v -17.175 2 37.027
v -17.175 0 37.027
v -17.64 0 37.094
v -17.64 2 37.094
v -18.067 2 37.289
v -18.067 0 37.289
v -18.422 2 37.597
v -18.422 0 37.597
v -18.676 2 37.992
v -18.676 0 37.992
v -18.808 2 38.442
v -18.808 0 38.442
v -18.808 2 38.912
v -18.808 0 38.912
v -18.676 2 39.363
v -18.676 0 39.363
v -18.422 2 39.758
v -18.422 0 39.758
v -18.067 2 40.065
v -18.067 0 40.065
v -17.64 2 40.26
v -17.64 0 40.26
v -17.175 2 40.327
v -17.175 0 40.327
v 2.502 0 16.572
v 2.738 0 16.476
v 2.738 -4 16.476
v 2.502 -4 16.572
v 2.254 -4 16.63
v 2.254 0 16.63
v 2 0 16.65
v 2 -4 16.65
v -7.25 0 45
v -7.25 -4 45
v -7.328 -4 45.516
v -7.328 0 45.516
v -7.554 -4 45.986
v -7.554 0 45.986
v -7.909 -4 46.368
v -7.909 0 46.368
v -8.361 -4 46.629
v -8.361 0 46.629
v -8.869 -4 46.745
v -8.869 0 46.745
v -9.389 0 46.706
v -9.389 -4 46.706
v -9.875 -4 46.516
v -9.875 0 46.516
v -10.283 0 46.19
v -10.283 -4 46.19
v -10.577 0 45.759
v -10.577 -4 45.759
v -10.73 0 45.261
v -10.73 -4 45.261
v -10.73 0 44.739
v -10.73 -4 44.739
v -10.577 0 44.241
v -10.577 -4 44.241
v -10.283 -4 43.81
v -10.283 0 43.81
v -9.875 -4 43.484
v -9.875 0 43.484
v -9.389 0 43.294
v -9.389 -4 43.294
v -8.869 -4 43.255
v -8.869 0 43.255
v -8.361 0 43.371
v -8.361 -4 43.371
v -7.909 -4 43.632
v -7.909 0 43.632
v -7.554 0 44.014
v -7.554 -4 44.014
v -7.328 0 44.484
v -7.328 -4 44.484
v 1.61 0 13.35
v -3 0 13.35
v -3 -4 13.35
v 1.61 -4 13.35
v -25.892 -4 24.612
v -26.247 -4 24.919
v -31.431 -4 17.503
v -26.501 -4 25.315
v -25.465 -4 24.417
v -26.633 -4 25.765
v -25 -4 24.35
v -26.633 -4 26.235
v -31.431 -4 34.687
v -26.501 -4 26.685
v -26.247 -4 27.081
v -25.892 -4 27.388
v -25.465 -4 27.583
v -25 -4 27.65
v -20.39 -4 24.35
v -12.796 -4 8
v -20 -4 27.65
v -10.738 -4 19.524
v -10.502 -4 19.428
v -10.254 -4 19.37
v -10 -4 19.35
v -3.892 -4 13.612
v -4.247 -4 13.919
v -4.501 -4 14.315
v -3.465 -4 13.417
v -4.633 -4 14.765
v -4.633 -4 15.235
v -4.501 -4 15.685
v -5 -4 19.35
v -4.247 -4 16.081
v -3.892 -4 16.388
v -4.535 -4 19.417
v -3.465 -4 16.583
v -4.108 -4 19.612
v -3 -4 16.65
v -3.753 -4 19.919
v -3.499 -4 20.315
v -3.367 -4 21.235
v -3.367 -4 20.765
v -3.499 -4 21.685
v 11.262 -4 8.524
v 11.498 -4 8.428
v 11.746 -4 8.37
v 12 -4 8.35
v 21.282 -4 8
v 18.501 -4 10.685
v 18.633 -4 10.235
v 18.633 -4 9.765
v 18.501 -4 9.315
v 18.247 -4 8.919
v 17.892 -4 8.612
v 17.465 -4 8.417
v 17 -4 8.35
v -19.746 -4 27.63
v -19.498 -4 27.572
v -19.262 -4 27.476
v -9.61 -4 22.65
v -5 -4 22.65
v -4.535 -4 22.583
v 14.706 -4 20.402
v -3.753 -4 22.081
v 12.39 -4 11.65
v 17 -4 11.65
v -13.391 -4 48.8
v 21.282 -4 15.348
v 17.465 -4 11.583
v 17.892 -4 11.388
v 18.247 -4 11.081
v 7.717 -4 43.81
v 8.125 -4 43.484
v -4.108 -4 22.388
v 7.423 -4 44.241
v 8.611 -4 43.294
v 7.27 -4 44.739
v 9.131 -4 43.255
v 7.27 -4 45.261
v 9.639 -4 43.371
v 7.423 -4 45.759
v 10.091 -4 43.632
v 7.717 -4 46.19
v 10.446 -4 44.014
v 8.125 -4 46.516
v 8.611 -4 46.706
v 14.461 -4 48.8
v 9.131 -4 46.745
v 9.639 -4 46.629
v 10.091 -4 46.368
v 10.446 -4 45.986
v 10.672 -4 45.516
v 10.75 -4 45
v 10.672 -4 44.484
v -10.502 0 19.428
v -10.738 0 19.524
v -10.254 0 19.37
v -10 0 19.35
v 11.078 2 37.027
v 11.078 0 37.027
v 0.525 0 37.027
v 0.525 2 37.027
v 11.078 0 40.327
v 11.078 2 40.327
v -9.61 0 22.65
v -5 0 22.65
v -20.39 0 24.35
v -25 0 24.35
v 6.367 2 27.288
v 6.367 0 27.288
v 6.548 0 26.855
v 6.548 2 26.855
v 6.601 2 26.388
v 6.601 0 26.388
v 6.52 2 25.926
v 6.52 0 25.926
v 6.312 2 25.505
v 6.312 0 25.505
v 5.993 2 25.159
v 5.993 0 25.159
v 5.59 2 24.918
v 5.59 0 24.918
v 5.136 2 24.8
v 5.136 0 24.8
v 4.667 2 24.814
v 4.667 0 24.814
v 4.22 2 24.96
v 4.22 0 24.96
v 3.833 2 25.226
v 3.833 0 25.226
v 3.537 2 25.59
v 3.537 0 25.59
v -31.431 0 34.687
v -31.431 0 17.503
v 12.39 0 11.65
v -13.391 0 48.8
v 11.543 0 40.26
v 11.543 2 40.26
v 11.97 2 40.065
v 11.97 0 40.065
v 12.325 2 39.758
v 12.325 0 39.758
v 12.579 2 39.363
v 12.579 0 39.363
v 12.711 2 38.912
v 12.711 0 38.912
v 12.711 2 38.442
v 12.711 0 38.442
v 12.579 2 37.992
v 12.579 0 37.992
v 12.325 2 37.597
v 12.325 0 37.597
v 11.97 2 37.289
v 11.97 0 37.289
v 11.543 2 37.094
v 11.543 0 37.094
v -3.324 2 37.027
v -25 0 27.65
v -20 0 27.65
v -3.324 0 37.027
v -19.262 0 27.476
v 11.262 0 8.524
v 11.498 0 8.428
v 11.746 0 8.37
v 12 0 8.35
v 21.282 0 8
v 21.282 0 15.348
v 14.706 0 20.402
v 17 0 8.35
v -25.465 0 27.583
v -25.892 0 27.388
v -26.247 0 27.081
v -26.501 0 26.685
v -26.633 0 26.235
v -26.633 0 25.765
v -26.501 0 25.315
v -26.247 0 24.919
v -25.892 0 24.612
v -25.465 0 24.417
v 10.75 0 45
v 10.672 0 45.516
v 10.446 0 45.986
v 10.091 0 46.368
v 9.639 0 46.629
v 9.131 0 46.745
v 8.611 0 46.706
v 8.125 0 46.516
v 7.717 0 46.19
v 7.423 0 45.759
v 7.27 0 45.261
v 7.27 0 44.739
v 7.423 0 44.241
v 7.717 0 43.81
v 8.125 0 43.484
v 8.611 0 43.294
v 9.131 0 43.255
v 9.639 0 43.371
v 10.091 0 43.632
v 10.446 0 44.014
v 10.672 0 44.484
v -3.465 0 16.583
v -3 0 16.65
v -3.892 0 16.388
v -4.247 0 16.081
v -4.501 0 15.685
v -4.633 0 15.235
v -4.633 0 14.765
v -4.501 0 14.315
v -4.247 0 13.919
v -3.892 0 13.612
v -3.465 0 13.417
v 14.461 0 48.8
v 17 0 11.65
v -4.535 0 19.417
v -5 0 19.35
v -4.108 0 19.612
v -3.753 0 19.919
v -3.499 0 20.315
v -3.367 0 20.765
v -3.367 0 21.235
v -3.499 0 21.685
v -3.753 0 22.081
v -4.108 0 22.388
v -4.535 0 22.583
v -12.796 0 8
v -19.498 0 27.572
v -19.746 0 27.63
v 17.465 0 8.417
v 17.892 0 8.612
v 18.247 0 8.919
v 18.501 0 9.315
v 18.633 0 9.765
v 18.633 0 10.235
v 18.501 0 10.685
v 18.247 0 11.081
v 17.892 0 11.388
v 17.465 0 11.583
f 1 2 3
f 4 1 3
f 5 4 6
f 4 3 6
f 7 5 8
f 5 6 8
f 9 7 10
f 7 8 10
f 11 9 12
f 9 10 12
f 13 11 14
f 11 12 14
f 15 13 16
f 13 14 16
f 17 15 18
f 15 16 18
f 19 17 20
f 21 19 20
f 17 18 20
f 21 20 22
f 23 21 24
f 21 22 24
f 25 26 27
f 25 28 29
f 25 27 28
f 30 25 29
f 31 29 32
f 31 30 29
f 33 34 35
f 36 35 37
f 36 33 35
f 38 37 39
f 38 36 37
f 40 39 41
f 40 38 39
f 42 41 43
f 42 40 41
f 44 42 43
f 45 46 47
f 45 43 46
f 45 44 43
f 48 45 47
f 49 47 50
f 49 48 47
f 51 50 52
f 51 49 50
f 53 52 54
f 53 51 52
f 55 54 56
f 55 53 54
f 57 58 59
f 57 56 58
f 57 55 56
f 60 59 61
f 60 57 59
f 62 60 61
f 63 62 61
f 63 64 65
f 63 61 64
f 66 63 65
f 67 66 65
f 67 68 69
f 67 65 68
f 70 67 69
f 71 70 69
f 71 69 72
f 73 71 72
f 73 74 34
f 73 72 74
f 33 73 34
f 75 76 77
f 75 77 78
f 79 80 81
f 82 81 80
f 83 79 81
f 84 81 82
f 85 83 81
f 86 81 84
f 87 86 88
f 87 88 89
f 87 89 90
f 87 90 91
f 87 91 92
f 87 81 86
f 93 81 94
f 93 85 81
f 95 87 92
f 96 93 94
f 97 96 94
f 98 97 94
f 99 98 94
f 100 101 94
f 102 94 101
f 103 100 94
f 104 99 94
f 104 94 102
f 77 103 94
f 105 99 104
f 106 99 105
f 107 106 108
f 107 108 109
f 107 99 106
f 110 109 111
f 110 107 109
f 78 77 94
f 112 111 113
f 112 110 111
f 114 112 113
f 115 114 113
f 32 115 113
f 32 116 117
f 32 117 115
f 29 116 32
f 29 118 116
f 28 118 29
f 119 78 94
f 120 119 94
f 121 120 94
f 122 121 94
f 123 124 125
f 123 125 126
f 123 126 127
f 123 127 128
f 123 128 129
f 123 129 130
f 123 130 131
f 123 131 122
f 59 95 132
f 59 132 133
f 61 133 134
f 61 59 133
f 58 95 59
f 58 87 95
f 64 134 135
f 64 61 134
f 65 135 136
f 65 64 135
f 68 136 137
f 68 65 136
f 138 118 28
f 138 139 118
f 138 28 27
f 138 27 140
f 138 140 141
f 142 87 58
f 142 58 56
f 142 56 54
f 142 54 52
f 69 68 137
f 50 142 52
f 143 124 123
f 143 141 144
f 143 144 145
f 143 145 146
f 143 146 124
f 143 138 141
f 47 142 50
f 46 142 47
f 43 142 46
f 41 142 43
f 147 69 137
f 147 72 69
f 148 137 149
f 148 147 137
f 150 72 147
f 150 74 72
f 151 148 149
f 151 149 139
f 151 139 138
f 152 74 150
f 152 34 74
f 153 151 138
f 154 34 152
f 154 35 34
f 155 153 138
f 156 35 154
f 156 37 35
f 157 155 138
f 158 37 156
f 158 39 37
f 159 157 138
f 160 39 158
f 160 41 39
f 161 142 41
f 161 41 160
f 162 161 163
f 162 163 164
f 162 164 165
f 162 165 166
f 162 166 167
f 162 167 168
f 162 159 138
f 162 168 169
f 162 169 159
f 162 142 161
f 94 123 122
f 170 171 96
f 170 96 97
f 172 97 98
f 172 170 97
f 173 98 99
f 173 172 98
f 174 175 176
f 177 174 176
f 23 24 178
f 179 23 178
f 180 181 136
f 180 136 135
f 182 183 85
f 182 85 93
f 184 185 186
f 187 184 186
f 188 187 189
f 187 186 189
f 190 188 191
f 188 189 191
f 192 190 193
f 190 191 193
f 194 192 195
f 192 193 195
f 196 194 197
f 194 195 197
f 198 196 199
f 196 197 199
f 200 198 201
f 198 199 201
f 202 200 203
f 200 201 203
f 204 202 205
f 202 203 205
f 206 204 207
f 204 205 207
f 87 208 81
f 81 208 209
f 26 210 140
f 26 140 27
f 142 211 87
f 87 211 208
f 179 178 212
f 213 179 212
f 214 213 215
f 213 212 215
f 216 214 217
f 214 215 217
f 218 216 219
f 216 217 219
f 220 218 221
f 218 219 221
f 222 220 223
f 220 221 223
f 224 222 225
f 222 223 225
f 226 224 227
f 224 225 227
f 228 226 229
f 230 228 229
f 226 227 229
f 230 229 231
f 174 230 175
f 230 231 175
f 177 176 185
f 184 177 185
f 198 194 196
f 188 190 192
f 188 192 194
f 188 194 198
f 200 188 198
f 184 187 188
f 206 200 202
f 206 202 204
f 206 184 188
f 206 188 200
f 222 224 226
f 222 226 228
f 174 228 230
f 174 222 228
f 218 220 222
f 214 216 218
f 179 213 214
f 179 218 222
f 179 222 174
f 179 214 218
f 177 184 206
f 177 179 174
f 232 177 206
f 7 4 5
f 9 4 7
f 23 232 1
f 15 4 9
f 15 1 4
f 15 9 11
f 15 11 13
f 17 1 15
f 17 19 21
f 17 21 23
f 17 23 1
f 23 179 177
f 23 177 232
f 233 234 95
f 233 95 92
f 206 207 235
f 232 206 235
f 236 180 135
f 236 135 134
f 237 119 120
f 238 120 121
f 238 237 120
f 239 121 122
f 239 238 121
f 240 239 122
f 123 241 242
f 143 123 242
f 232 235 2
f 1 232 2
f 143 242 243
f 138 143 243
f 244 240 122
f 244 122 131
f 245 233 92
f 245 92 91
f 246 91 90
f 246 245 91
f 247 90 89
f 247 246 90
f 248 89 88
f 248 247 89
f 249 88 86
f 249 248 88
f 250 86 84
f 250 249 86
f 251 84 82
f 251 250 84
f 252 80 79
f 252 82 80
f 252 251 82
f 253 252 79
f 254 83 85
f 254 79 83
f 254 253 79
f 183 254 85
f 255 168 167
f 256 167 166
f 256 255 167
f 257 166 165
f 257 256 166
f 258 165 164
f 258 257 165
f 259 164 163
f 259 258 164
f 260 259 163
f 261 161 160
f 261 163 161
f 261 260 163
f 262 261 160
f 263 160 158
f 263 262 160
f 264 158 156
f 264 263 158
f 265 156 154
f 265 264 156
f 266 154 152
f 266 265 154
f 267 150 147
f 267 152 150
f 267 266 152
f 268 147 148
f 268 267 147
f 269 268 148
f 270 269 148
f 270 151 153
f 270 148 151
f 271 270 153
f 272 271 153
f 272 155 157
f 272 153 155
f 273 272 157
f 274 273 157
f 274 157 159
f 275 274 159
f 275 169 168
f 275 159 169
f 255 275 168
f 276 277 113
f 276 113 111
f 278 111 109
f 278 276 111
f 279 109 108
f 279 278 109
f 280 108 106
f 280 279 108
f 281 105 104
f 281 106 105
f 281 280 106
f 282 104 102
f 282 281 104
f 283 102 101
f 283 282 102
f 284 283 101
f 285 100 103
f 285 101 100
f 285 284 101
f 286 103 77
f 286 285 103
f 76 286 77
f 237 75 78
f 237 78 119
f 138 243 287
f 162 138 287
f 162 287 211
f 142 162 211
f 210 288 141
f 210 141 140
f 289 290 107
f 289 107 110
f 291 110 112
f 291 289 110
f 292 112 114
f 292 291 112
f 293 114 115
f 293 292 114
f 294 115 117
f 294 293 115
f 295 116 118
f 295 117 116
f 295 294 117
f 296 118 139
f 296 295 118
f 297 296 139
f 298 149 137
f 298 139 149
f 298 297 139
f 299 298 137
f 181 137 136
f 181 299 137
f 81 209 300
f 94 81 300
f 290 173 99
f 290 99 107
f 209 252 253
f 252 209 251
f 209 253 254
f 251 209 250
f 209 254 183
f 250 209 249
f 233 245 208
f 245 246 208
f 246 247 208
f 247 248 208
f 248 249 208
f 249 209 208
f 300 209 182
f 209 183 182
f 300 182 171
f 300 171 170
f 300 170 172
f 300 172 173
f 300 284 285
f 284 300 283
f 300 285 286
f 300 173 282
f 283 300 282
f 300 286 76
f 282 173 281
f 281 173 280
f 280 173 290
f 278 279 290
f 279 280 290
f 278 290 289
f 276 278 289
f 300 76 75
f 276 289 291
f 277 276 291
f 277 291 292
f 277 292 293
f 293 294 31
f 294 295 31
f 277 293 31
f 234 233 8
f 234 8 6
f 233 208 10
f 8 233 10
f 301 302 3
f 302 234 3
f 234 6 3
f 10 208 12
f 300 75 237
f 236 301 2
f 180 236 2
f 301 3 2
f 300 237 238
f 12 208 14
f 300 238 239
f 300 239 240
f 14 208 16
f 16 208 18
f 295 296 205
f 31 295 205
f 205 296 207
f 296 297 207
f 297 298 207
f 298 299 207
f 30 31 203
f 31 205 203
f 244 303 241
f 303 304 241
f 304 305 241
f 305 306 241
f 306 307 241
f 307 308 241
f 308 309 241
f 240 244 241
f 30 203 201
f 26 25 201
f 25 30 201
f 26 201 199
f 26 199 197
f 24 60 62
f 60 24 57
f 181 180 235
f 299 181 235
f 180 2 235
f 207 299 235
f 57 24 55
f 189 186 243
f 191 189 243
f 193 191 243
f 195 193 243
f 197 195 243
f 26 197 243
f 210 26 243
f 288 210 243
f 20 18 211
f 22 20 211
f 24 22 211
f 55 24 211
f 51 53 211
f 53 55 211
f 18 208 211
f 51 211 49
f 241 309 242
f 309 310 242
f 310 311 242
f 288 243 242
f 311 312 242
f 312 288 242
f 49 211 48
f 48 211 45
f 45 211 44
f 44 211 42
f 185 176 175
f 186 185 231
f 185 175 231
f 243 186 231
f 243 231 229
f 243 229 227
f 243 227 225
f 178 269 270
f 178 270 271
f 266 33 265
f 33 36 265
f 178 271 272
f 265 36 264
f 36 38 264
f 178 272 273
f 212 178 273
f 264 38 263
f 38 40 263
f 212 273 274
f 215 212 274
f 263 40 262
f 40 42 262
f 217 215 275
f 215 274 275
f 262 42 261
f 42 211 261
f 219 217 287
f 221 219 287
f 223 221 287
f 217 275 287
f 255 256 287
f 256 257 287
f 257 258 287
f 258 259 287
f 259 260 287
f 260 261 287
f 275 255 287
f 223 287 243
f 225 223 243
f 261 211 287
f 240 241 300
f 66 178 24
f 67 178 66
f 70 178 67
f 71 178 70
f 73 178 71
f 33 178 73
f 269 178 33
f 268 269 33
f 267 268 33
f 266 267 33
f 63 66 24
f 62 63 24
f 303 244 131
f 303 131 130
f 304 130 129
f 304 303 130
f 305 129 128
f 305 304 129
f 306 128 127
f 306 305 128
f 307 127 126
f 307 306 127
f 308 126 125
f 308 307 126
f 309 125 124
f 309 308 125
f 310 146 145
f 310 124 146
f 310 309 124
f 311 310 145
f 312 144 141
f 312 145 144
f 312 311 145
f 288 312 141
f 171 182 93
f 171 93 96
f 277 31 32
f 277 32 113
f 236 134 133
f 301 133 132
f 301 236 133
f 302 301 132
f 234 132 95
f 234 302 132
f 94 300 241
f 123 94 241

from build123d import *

# Parameters (mm, degrees)
F4_DEPTH = 4
F0_R     = 1.75
F5_DEPTH = 25
F7_DEPTH = 2


with BuildPart() as f4:
    # F3 (on Front) → F4 (new body)
    with BuildSketch(Plane.XZ):
        Polygon((14.7063490003, 20.4016491771), (14.4608622171, 48.8), (-13.3913809769, 48.8), (-31.4313102054, 34.6867430935), (-31.4313102054, 17.5032976646), (-12.7962362449, 8), (21.2817378342, 8), (21.2817378342, 15.3483422473), align=None)
    extrude(amount=F4_DEPTH)

    # F0 (on Front) + F1 (on Front) + F2 (on Front) → F5 (cut)
    with BuildSketch(Plane.XZ):
        with Locations((-9, 45)):
            Circle(F0_R)
        with Locations((9, 45)):
            Circle(F0_R)
    with BuildSketch(Plane.XZ):
        with BuildLine():
            Line((10.5241951349, 10.7379024326), (12, 10))
            Line((12, 10), (13.65, 10))
            ThreePointArc((13.65, 10), (13.4035738338, 10.867456335), (12.7379024326, 11.4758048651))
            Line((12.7379024326, 11.4758048651), (12.3895121629, 11.65))
            Line((12.3895121629, 11.65), (12, 11.65))
            ThreePointArc((12, 11.65), (11.132543665, 11.4035738338), (10.5241951349, 10.7379024326))
        make_face()
        with BuildLine():
            Line((13.65, 10), (12, 10))
            Line((12, 10), (10.5241951349, 10.7379024326))
            ThreePointArc((10.5241951349, 10.7379024326), (10.4346725582, 9.4782241861), (11.2620975674, 8.5241951349))
            ThreePointArc((11.2620975674, 8.5241951349), (11.6209076811, 8.3941391674), (12, 8.35))
            ThreePointArc((12, 8.35), (13.166726189, 8.833273811), (13.65, 10))
        make_face()
        with BuildLine():
            ThreePointArc((12.7379024326, 11.4758048651), (13.4035738338, 10.867456335), (13.65, 10))
            ThreePointArc((13.65, 10), (13.166726189, 8.833273811), (12, 8.35))
            Line((12, 8.35), (17, 8.35))
            ThreePointArc((17, 8.35), (18.65, 10), (17, 11.65))
            Line((17, 11.65), (12.3895121629, 11.65))
            Line((12.3895121629, 11.65), (12.7379024326, 11.4758048651))
        make_face()
        with BuildLine():
            ThreePointArc((11.2620975674, 8.5241951349), (10.4346725582, 9.4782241861), (10.5241951349, 10.7379024326))
            Line((10.5241951349, 10.7379024326), (3.4758048651, 14.2620975674))
            ThreePointArc((3.4758048651, 14.2620975674), (2.867456335, 13.5964261662), (2, 13.35))
            Line((2, 13.35), (1.6104878371, 13.35))
            Line((1.6104878371, 13.35), (11.2620975674, 8.5241951349))
        make_face()
        with BuildLine():
            Line((3.4758048651, 14.2620975674), (10.5241951349, 10.7379024326))
            ThreePointArc((10.5241951349, 10.7379024326), (11.132543665, 11.4035738338), (12, 11.65))
            Line((12, 11.65), (12.3895121629, 11.65))
            Line((12.3895121629, 11.65), (2.7379024326, 16.4758048651))
            ThreePointArc((2.7379024326, 16.4758048651), (3.5653274418, 15.5217758139), (3.4758048651, 14.2620975674))
        make_face()
        with BuildLine():
            ThreePointArc((2, 13.35), (2.867456335, 13.5964261662), (3.4758048651, 14.2620975674))
            Line((3.4758048651, 14.2620975674), (2, 15))
            Line((2, 15), (0.35, 15))
            ThreePointArc((0.35, 15), (0.5964261662, 14.132543665), (1.2620975674, 13.5241951349))
            Line((1.2620975674, 13.5241951349), (1.6104878371, 13.35))
            Line((1.6104878371, 13.35), (2, 13.35))
        make_face()
        with BuildLine():
            Line((2, 15), (3.4758048651, 14.2620975674))
            ThreePointArc((3.4758048651, 14.2620975674), (3.5653274418, 15.5217758139), (2.7379024326, 16.4758048651))
            ThreePointArc((2.7379024326, 16.4758048651), (2.3790923189, 16.6058608326), (2, 16.65))
            ThreePointArc((2, 16.65), (0.833273811, 16.166726189), (0.35, 15))
            Line((0.35, 15), (2, 15))
        make_face()
        with BuildLine():
            Line((-3, 13.35), (1.6104878371, 13.35))
            Line((1.6104878371, 13.35), (1.2620975674, 13.5241951349))
            ThreePointArc((1.2620975674, 13.5241951349), (0.5964261662, 14.132543665), (0.35, 15))
            ThreePointArc((0.35, 15), (0.833273811, 16.166726189), (2, 16.65))
            Line((2, 16.65), (-3, 16.65))
            ThreePointArc((-3, 16.65), (-4.65, 15), (-3, 13.35))
        make_face()
    with BuildSketch(Plane.XZ):
        with BuildLine():
            Line((-11.4758048651, 21.7379024326), (-10, 21))
            Line((-10, 21), (-8.35, 21))
            ThreePointArc((-8.35, 21), (-8.5964261662, 21.867456335), (-9.2620975674, 22.4758048651))
            Line((-9.2620975674, 22.4758048651), (-9.6104878371, 22.65))
            Line((-9.6104878371, 22.65), (-10, 22.65))
            ThreePointArc((-10, 22.65), (-10.867456335, 22.4035738338), (-11.4758048651, 21.7379024326))
        make_face()
        with BuildLine():
            Line((-8.35, 21), (-10, 21))
            Line((-10, 21), (-11.4758048651, 21.7379024326))
            ThreePointArc((-11.4758048651, 21.7379024326), (-11.5653274418, 20.4782241861), (-10.7379024326, 19.5241951349))
            ThreePointArc((-10.7379024326, 19.5241951349), (-10.3790923189, 19.3941391674), (-10, 19.35))
            ThreePointArc((-10, 19.35), (-8.833273811, 19.833273811), (-8.35, 21))
        make_face()
        with BuildLine():
            ThreePointArc((-9.2620975674, 22.4758048651), (-8.5964261662, 21.867456335), (-8.35, 21))
            ThreePointArc((-8.35, 21), (-8.833273811, 19.833273811), (-10, 19.35))
            Line((-10, 19.35), (-5, 19.35))
            ThreePointArc((-5, 19.35), (-3.35, 21), (-5, 22.65))
            Line((-5, 22.65), (-9.6104878371, 22.65))
            Line((-9.6104878371, 22.65), (-9.2620975674, 22.4758048651))
        make_face()
        with BuildLine():
            ThreePointArc((-10.7379024326, 19.5241951349), (-11.5653274418, 20.4782241861), (-11.4758048651, 21.7379024326))
            Line((-11.4758048651, 21.7379024326), (-18.5241951349, 25.2620975674))
            ThreePointArc((-18.5241951349, 25.2620975674), (-19.132543665, 24.5964261662), (-20, 24.35))
            Line((-20, 24.35), (-20.3895121629, 24.35))
            Line((-20.3895121629, 24.35), (-10.7379024326, 19.5241951349))
        make_face()
        with BuildLine():
            Line((-18.5241951349, 25.2620975674), (-11.4758048651, 21.7379024326))
            ThreePointArc((-11.4758048651, 21.7379024326), (-10.867456335, 22.4035738338), (-10, 22.65))
            Line((-10, 22.65), (-9.6104878371, 22.65))
            Line((-9.6104878371, 22.65), (-19.2620975674, 27.4758048651))
            ThreePointArc((-19.2620975674, 27.4758048651), (-18.4346725582, 26.5217758139), (-18.5241951349, 25.2620975674))
        make_face()
        with BuildLine():
            ThreePointArc((-20, 24.35), (-19.132543665, 24.5964261662), (-18.5241951349, 25.2620975674))
            Line((-18.5241951349, 25.2620975674), (-20, 26))
            Line((-20, 26), (-21.65, 26))
            ThreePointArc((-21.65, 26), (-21.4035738338, 25.132543665), (-20.7379024326, 24.5241951349))
            Line((-20.7379024326, 24.5241951349), (-20.3895121629, 24.35))
            Line((-20.3895121629, 24.35), (-20, 24.35))
        make_face()
        with BuildLine():
            Line((-20, 26), (-18.5241951349, 25.2620975674))
            ThreePointArc((-18.5241951349, 25.2620975674), (-18.4346725582, 26.5217758139), (-19.2620975674, 27.4758048651))
            ThreePointArc((-19.2620975674, 27.4758048651), (-19.6209076811, 27.6058608326), (-20, 27.65))
            ThreePointArc((-20, 27.65), (-21.166726189, 27.166726189), (-21.65, 26))
            Line((-21.65, 26), (-20, 26))
        make_face()
        with BuildLine():
            Line((-25, 24.35), (-20.3895121629, 24.35))
            Line((-20.3895121629, 24.35), (-20.7379024326, 24.5241951349))
            ThreePointArc((-20.7379024326, 24.5241951349), (-21.4035738338, 25.132543665), (-21.65, 26))
            ThreePointArc((-21.65, 26), (-21.166726189, 27.166726189), (-20, 27.65))
            Line((-20, 27.65), (-25, 27.65))
            ThreePointArc((-25, 27.65), (-26.65, 26), (-25, 24.35))
        make_face()
    extrude(amount=F5_DEPTH, mode=Mode.SUBTRACT)

    # F6 (on face) → F7 (join)
    with BuildSketch(Plane(origin=(0, 0, 0), x_dir=(-1, 0, 0), z_dir=(0, 1, 0))):
        with BuildLine():
            Line((0.9742605893, 39.5259801518), (0.4651322738, 38.6772193015))
            Line((0.4651322738, 38.6772193015), (2.3892181925, 38.6772193015))
            Line((2.3892181925, 38.6772193015), (4.0392181925, 38.6772193015))
            ThreePointArc((4.0392181925, 38.6772193015), (3.5559443815, 39.8439454904), (2.3892181925, 40.3272193015))
            ThreePointArc((2.3892181925, 40.3272193015), (1.5761854143, 40.1130040003), (0.9742605893, 39.5259801518))
        make_face()
        with BuildLine():
            Line((-0.5246185145, 37.0272193015), (0.4651322738, 38.6772193015))
            Line((0.4651322738, 38.6772193015), (0.9742605893, 39.5259801518))
            ThreePointArc((0.9742605893, 39.5259801518), (1.5761854143, 40.1130040003), (2.3892181925, 40.3272193015))
            Line((2.3892181925, 40.3272193015), (-11.0781090334, 40.3272193015))
            ThreePointArc((-11.0781090334, 40.3272193015), (-12.7281090334, 38.6772193015), (-11.0781090334, 37.0272193015))
            Line((-11.0781090334, 37.0272193015), (-0.5246185145, 37.0272193015))
        make_face()
        Polygon((2.3892181925, 38.6772193015), (0.4651322738, 38.6772193015), (-0.5246185145, 37.0272193015), (1.3994674043, 37.0272193015), align=None)
        with BuildLine():
            Line((4.0392181925, 38.6772193015), (2.3892181925, 38.6772193015))
            Line((2.3892181925, 38.6772193015), (1.3994674043, 37.0272193015))
            Line((1.3994674043, 37.0272193015), (3.3235533231, 37.0272193015))
            Line((3.3235533231, 37.0272193015), (3.8041757958, 37.8284584511))
            ThreePointArc((3.8041757958, 37.8284584511), (3.9793722803, 38.2368671954), (4.0392181925, 38.6772193015))
        make_face()
        with BuildLine():
            Line((1.3994674043, 37.0272193015), (-0.5246185145, 37.0272193015))
            Line((-0.5246185145, 37.0272193015), (-6.3666907677, 27.2879805636))
            ThreePointArc((-6.3666907677, 27.2879805636), (-5.8004940149, 25.02426211), (-3.5367755613, 25.5904588628))
            Line((-3.5367755613, 25.5904588628), (3.3235533231, 37.0272193015))
            Line((3.3235533231, 37.0272193015), (1.3994674043, 37.0272193015))
        make_face()
        with BuildLine():
            ThreePointArc((2.3892181925, 40.3272193015), (3.5559443815, 39.8439454904), (4.0392181925, 38.6772193015))
            ThreePointArc((4.0392181925, 38.6772193015), (3.9793722803, 38.2368671954), (3.8041757958, 37.8284584511))
            Line((3.8041757958, 37.8284584511), (3.3235533231, 37.0272193015))
            Line((3.3235533231, 37.0272193015), (17.1748909666, 37.0272193015))
            ThreePointArc((17.1748909666, 37.0272193015), (18.8248909666, 38.6772193015), (17.1748909666, 40.3272193015))
            Line((17.1748909666, 40.3272193015), (2.3892181925, 40.3272193015))
        make_face()
    extrude(amount=F7_DEPTH)


solid = f4.part
